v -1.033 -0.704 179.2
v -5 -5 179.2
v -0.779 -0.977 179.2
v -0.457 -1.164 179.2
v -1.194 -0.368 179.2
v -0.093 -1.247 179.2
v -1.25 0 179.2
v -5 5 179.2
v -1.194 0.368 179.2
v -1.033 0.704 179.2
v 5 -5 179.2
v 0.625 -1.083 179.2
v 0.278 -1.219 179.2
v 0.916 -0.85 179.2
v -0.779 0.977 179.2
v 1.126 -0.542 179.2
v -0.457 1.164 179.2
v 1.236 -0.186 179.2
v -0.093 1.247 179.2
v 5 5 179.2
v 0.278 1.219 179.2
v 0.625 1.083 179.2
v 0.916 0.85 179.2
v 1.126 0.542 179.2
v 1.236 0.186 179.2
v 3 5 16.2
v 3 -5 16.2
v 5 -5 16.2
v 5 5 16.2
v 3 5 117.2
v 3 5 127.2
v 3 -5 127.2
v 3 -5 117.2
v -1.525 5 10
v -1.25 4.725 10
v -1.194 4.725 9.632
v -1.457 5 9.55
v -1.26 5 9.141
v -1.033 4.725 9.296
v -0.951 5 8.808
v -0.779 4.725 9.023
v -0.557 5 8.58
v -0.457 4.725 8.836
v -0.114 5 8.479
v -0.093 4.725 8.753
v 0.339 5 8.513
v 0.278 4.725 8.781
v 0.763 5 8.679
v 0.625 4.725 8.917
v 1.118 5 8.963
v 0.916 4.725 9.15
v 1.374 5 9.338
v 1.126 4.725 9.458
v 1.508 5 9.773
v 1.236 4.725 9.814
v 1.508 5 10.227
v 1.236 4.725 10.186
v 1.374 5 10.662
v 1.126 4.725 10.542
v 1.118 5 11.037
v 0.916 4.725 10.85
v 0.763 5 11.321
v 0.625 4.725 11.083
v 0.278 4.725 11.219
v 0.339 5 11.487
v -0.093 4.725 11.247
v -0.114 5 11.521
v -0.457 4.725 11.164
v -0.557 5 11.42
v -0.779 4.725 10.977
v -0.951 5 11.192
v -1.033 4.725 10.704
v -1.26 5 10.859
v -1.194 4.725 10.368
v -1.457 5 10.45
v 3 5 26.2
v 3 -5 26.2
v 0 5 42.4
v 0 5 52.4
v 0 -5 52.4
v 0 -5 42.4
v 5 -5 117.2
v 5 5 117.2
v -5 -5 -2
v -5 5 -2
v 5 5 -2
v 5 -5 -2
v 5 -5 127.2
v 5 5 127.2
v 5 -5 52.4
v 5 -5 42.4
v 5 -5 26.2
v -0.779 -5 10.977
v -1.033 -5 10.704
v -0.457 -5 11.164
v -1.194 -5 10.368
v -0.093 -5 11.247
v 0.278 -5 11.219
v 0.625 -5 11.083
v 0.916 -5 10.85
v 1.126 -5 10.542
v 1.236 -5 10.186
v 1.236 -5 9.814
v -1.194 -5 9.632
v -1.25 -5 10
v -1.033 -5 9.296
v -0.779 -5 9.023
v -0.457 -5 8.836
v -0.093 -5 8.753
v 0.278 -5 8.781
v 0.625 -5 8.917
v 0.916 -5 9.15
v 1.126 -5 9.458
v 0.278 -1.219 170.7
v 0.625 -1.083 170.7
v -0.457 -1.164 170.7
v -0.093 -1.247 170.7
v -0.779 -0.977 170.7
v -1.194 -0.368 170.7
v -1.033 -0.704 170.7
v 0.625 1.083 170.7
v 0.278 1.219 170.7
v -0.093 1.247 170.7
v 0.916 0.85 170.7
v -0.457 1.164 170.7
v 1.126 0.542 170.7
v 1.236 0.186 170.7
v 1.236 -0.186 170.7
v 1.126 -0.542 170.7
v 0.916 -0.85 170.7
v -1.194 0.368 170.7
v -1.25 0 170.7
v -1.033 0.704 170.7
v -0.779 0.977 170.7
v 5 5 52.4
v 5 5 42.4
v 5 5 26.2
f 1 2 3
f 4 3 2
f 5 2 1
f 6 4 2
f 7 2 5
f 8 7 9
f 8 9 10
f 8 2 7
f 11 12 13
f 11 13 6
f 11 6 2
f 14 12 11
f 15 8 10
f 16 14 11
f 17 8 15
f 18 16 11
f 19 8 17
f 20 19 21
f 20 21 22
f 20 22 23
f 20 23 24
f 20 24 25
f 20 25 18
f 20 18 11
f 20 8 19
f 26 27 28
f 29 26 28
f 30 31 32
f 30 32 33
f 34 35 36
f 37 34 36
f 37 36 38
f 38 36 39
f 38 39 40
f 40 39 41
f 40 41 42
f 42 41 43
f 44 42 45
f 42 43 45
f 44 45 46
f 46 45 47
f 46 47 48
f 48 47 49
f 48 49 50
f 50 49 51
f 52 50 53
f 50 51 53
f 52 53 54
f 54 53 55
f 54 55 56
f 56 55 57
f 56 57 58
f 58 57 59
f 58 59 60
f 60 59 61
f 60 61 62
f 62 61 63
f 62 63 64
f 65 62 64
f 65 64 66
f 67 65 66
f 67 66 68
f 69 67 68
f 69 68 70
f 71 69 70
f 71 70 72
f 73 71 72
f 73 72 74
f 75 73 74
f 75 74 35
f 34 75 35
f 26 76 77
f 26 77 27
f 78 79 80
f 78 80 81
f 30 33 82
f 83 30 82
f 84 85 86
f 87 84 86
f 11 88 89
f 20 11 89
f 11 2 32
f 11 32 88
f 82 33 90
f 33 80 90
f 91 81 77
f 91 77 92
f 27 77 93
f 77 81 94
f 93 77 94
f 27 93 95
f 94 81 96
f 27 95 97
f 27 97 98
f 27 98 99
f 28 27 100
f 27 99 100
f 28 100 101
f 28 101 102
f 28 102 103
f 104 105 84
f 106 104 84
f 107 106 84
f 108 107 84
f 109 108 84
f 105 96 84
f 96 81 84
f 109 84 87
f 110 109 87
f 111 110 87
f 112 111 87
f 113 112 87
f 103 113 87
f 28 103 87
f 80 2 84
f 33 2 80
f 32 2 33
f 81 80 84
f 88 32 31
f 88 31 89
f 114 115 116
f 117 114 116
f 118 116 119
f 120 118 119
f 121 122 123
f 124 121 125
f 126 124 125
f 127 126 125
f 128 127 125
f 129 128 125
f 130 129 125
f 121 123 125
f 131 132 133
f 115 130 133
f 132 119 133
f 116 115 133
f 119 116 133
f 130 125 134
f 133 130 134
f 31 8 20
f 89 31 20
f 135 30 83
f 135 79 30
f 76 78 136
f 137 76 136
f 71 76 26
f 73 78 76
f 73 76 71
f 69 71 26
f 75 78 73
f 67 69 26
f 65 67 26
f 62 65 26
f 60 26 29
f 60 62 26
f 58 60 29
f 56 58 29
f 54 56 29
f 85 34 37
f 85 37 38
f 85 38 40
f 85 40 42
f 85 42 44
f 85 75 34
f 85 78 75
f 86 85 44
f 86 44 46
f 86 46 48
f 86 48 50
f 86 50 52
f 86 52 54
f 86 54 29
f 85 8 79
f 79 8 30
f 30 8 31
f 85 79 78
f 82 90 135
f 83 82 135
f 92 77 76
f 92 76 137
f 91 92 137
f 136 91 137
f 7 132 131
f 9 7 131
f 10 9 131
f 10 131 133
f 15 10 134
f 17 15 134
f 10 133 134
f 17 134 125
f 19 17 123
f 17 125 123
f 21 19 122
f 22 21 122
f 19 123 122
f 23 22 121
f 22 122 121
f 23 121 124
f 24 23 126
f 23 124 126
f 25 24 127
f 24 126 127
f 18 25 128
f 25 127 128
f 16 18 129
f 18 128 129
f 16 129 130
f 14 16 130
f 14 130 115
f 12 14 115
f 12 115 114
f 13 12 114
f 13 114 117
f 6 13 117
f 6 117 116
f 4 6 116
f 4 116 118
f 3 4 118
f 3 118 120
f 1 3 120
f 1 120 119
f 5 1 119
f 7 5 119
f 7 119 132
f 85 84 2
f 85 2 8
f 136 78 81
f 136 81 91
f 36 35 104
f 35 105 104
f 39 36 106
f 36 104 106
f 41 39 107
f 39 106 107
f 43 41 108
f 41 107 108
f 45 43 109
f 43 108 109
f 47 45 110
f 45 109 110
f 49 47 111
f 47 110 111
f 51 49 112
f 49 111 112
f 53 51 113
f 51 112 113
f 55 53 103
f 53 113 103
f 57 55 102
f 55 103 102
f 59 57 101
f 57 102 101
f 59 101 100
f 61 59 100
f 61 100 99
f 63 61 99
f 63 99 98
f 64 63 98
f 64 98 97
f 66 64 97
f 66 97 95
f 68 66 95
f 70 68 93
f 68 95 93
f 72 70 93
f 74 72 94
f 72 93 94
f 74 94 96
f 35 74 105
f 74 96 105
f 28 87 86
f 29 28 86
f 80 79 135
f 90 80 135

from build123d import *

# Parameters (mm, degrees)
BOSS_EXTRU_1_DEPTH              = 179.2
BOSS_EXTRU_1_DEPTH_BACK         = 2
ESQUISSE1_W                     = 10
ESQUISSE1_H                     = 10
ESQUISSE2_W                     = 2
ESQUISSE2_H                     = 10
ESQUISSE2_W_2                   = 5
ENL_V_MAT_EXTRU_1_DEPTH         = 180.548433577
TROU_TARAUD_M3X0_51_D           = 2.5
TROU_TARAUD_M3X0_51_CSINK_D     = 3.05
TROU_TARAUD_M3X0_51_CSINK_ANGLE = 90
TROU_TARAUD_M3X0_52_D           = 2.5
TROU_TARAUD_M3X0_52_DEPTH       = 8.5


with BuildPart() as part:
    # Esquisse1 → Boss.-Extru.1 (new, two sides: drawn at the far end of the back side and taken through both)
    with BuildSketch(Plane.XY.offset(-BOSS_EXTRU_1_DEPTH_BACK)):
        Rectangle(ESQUISSE1_W, ESQUISSE1_H)
    extrude(amount=BOSS_EXTRU_1_DEPTH + BOSS_EXTRU_1_DEPTH_BACK)

    # Esquisse2 → Enlèv. mat.-Extru.1 (cut, through all)
    with BuildSketch(Plane(origin=(0, 5, 0), x_dir=(1, 0, 0), z_dir=(0, 1, 0))):
        with Locations((4, -122.2)):
            Rectangle(ESQUISSE2_W, ESQUISSE2_H)
        with Locations((4, -21.2)):
            Rectangle(ESQUISSE2_W, ESQUISSE2_H)
        with Locations((2.5, -47.4)):
            Rectangle(ESQUISSE2_W_2, ESQUISSE2_H)
    extrude(amount=-ENL_V_MAT_EXTRU_1_DEPTH, mode=Mode.SUBTRACT)

    # Trou taraudé M3x0.51 (through all)
    with Locations(Plane(origin=(0, 5, 0), x_dir=(1, 0, 0), z_dir=(0, 1, 0))):
        with Locations((0, -10)):
            CounterSinkHole(TROU_TARAUD_M3X0_51_D / 2, TROU_TARAUD_M3X0_51_CSINK_D / 2, counter_sink_angle=TROU_TARAUD_M3X0_51_CSINK_ANGLE)

    # Trou taraudé M3x0.52
    with Locations(Plane.XY.offset(179.2)):
        with Locations((0, 0)):
            Hole(TROU_TARAUD_M3X0_52_D / 2, depth=TROU_TARAUD_M3X0_52_DEPTH)


solid = part.part
